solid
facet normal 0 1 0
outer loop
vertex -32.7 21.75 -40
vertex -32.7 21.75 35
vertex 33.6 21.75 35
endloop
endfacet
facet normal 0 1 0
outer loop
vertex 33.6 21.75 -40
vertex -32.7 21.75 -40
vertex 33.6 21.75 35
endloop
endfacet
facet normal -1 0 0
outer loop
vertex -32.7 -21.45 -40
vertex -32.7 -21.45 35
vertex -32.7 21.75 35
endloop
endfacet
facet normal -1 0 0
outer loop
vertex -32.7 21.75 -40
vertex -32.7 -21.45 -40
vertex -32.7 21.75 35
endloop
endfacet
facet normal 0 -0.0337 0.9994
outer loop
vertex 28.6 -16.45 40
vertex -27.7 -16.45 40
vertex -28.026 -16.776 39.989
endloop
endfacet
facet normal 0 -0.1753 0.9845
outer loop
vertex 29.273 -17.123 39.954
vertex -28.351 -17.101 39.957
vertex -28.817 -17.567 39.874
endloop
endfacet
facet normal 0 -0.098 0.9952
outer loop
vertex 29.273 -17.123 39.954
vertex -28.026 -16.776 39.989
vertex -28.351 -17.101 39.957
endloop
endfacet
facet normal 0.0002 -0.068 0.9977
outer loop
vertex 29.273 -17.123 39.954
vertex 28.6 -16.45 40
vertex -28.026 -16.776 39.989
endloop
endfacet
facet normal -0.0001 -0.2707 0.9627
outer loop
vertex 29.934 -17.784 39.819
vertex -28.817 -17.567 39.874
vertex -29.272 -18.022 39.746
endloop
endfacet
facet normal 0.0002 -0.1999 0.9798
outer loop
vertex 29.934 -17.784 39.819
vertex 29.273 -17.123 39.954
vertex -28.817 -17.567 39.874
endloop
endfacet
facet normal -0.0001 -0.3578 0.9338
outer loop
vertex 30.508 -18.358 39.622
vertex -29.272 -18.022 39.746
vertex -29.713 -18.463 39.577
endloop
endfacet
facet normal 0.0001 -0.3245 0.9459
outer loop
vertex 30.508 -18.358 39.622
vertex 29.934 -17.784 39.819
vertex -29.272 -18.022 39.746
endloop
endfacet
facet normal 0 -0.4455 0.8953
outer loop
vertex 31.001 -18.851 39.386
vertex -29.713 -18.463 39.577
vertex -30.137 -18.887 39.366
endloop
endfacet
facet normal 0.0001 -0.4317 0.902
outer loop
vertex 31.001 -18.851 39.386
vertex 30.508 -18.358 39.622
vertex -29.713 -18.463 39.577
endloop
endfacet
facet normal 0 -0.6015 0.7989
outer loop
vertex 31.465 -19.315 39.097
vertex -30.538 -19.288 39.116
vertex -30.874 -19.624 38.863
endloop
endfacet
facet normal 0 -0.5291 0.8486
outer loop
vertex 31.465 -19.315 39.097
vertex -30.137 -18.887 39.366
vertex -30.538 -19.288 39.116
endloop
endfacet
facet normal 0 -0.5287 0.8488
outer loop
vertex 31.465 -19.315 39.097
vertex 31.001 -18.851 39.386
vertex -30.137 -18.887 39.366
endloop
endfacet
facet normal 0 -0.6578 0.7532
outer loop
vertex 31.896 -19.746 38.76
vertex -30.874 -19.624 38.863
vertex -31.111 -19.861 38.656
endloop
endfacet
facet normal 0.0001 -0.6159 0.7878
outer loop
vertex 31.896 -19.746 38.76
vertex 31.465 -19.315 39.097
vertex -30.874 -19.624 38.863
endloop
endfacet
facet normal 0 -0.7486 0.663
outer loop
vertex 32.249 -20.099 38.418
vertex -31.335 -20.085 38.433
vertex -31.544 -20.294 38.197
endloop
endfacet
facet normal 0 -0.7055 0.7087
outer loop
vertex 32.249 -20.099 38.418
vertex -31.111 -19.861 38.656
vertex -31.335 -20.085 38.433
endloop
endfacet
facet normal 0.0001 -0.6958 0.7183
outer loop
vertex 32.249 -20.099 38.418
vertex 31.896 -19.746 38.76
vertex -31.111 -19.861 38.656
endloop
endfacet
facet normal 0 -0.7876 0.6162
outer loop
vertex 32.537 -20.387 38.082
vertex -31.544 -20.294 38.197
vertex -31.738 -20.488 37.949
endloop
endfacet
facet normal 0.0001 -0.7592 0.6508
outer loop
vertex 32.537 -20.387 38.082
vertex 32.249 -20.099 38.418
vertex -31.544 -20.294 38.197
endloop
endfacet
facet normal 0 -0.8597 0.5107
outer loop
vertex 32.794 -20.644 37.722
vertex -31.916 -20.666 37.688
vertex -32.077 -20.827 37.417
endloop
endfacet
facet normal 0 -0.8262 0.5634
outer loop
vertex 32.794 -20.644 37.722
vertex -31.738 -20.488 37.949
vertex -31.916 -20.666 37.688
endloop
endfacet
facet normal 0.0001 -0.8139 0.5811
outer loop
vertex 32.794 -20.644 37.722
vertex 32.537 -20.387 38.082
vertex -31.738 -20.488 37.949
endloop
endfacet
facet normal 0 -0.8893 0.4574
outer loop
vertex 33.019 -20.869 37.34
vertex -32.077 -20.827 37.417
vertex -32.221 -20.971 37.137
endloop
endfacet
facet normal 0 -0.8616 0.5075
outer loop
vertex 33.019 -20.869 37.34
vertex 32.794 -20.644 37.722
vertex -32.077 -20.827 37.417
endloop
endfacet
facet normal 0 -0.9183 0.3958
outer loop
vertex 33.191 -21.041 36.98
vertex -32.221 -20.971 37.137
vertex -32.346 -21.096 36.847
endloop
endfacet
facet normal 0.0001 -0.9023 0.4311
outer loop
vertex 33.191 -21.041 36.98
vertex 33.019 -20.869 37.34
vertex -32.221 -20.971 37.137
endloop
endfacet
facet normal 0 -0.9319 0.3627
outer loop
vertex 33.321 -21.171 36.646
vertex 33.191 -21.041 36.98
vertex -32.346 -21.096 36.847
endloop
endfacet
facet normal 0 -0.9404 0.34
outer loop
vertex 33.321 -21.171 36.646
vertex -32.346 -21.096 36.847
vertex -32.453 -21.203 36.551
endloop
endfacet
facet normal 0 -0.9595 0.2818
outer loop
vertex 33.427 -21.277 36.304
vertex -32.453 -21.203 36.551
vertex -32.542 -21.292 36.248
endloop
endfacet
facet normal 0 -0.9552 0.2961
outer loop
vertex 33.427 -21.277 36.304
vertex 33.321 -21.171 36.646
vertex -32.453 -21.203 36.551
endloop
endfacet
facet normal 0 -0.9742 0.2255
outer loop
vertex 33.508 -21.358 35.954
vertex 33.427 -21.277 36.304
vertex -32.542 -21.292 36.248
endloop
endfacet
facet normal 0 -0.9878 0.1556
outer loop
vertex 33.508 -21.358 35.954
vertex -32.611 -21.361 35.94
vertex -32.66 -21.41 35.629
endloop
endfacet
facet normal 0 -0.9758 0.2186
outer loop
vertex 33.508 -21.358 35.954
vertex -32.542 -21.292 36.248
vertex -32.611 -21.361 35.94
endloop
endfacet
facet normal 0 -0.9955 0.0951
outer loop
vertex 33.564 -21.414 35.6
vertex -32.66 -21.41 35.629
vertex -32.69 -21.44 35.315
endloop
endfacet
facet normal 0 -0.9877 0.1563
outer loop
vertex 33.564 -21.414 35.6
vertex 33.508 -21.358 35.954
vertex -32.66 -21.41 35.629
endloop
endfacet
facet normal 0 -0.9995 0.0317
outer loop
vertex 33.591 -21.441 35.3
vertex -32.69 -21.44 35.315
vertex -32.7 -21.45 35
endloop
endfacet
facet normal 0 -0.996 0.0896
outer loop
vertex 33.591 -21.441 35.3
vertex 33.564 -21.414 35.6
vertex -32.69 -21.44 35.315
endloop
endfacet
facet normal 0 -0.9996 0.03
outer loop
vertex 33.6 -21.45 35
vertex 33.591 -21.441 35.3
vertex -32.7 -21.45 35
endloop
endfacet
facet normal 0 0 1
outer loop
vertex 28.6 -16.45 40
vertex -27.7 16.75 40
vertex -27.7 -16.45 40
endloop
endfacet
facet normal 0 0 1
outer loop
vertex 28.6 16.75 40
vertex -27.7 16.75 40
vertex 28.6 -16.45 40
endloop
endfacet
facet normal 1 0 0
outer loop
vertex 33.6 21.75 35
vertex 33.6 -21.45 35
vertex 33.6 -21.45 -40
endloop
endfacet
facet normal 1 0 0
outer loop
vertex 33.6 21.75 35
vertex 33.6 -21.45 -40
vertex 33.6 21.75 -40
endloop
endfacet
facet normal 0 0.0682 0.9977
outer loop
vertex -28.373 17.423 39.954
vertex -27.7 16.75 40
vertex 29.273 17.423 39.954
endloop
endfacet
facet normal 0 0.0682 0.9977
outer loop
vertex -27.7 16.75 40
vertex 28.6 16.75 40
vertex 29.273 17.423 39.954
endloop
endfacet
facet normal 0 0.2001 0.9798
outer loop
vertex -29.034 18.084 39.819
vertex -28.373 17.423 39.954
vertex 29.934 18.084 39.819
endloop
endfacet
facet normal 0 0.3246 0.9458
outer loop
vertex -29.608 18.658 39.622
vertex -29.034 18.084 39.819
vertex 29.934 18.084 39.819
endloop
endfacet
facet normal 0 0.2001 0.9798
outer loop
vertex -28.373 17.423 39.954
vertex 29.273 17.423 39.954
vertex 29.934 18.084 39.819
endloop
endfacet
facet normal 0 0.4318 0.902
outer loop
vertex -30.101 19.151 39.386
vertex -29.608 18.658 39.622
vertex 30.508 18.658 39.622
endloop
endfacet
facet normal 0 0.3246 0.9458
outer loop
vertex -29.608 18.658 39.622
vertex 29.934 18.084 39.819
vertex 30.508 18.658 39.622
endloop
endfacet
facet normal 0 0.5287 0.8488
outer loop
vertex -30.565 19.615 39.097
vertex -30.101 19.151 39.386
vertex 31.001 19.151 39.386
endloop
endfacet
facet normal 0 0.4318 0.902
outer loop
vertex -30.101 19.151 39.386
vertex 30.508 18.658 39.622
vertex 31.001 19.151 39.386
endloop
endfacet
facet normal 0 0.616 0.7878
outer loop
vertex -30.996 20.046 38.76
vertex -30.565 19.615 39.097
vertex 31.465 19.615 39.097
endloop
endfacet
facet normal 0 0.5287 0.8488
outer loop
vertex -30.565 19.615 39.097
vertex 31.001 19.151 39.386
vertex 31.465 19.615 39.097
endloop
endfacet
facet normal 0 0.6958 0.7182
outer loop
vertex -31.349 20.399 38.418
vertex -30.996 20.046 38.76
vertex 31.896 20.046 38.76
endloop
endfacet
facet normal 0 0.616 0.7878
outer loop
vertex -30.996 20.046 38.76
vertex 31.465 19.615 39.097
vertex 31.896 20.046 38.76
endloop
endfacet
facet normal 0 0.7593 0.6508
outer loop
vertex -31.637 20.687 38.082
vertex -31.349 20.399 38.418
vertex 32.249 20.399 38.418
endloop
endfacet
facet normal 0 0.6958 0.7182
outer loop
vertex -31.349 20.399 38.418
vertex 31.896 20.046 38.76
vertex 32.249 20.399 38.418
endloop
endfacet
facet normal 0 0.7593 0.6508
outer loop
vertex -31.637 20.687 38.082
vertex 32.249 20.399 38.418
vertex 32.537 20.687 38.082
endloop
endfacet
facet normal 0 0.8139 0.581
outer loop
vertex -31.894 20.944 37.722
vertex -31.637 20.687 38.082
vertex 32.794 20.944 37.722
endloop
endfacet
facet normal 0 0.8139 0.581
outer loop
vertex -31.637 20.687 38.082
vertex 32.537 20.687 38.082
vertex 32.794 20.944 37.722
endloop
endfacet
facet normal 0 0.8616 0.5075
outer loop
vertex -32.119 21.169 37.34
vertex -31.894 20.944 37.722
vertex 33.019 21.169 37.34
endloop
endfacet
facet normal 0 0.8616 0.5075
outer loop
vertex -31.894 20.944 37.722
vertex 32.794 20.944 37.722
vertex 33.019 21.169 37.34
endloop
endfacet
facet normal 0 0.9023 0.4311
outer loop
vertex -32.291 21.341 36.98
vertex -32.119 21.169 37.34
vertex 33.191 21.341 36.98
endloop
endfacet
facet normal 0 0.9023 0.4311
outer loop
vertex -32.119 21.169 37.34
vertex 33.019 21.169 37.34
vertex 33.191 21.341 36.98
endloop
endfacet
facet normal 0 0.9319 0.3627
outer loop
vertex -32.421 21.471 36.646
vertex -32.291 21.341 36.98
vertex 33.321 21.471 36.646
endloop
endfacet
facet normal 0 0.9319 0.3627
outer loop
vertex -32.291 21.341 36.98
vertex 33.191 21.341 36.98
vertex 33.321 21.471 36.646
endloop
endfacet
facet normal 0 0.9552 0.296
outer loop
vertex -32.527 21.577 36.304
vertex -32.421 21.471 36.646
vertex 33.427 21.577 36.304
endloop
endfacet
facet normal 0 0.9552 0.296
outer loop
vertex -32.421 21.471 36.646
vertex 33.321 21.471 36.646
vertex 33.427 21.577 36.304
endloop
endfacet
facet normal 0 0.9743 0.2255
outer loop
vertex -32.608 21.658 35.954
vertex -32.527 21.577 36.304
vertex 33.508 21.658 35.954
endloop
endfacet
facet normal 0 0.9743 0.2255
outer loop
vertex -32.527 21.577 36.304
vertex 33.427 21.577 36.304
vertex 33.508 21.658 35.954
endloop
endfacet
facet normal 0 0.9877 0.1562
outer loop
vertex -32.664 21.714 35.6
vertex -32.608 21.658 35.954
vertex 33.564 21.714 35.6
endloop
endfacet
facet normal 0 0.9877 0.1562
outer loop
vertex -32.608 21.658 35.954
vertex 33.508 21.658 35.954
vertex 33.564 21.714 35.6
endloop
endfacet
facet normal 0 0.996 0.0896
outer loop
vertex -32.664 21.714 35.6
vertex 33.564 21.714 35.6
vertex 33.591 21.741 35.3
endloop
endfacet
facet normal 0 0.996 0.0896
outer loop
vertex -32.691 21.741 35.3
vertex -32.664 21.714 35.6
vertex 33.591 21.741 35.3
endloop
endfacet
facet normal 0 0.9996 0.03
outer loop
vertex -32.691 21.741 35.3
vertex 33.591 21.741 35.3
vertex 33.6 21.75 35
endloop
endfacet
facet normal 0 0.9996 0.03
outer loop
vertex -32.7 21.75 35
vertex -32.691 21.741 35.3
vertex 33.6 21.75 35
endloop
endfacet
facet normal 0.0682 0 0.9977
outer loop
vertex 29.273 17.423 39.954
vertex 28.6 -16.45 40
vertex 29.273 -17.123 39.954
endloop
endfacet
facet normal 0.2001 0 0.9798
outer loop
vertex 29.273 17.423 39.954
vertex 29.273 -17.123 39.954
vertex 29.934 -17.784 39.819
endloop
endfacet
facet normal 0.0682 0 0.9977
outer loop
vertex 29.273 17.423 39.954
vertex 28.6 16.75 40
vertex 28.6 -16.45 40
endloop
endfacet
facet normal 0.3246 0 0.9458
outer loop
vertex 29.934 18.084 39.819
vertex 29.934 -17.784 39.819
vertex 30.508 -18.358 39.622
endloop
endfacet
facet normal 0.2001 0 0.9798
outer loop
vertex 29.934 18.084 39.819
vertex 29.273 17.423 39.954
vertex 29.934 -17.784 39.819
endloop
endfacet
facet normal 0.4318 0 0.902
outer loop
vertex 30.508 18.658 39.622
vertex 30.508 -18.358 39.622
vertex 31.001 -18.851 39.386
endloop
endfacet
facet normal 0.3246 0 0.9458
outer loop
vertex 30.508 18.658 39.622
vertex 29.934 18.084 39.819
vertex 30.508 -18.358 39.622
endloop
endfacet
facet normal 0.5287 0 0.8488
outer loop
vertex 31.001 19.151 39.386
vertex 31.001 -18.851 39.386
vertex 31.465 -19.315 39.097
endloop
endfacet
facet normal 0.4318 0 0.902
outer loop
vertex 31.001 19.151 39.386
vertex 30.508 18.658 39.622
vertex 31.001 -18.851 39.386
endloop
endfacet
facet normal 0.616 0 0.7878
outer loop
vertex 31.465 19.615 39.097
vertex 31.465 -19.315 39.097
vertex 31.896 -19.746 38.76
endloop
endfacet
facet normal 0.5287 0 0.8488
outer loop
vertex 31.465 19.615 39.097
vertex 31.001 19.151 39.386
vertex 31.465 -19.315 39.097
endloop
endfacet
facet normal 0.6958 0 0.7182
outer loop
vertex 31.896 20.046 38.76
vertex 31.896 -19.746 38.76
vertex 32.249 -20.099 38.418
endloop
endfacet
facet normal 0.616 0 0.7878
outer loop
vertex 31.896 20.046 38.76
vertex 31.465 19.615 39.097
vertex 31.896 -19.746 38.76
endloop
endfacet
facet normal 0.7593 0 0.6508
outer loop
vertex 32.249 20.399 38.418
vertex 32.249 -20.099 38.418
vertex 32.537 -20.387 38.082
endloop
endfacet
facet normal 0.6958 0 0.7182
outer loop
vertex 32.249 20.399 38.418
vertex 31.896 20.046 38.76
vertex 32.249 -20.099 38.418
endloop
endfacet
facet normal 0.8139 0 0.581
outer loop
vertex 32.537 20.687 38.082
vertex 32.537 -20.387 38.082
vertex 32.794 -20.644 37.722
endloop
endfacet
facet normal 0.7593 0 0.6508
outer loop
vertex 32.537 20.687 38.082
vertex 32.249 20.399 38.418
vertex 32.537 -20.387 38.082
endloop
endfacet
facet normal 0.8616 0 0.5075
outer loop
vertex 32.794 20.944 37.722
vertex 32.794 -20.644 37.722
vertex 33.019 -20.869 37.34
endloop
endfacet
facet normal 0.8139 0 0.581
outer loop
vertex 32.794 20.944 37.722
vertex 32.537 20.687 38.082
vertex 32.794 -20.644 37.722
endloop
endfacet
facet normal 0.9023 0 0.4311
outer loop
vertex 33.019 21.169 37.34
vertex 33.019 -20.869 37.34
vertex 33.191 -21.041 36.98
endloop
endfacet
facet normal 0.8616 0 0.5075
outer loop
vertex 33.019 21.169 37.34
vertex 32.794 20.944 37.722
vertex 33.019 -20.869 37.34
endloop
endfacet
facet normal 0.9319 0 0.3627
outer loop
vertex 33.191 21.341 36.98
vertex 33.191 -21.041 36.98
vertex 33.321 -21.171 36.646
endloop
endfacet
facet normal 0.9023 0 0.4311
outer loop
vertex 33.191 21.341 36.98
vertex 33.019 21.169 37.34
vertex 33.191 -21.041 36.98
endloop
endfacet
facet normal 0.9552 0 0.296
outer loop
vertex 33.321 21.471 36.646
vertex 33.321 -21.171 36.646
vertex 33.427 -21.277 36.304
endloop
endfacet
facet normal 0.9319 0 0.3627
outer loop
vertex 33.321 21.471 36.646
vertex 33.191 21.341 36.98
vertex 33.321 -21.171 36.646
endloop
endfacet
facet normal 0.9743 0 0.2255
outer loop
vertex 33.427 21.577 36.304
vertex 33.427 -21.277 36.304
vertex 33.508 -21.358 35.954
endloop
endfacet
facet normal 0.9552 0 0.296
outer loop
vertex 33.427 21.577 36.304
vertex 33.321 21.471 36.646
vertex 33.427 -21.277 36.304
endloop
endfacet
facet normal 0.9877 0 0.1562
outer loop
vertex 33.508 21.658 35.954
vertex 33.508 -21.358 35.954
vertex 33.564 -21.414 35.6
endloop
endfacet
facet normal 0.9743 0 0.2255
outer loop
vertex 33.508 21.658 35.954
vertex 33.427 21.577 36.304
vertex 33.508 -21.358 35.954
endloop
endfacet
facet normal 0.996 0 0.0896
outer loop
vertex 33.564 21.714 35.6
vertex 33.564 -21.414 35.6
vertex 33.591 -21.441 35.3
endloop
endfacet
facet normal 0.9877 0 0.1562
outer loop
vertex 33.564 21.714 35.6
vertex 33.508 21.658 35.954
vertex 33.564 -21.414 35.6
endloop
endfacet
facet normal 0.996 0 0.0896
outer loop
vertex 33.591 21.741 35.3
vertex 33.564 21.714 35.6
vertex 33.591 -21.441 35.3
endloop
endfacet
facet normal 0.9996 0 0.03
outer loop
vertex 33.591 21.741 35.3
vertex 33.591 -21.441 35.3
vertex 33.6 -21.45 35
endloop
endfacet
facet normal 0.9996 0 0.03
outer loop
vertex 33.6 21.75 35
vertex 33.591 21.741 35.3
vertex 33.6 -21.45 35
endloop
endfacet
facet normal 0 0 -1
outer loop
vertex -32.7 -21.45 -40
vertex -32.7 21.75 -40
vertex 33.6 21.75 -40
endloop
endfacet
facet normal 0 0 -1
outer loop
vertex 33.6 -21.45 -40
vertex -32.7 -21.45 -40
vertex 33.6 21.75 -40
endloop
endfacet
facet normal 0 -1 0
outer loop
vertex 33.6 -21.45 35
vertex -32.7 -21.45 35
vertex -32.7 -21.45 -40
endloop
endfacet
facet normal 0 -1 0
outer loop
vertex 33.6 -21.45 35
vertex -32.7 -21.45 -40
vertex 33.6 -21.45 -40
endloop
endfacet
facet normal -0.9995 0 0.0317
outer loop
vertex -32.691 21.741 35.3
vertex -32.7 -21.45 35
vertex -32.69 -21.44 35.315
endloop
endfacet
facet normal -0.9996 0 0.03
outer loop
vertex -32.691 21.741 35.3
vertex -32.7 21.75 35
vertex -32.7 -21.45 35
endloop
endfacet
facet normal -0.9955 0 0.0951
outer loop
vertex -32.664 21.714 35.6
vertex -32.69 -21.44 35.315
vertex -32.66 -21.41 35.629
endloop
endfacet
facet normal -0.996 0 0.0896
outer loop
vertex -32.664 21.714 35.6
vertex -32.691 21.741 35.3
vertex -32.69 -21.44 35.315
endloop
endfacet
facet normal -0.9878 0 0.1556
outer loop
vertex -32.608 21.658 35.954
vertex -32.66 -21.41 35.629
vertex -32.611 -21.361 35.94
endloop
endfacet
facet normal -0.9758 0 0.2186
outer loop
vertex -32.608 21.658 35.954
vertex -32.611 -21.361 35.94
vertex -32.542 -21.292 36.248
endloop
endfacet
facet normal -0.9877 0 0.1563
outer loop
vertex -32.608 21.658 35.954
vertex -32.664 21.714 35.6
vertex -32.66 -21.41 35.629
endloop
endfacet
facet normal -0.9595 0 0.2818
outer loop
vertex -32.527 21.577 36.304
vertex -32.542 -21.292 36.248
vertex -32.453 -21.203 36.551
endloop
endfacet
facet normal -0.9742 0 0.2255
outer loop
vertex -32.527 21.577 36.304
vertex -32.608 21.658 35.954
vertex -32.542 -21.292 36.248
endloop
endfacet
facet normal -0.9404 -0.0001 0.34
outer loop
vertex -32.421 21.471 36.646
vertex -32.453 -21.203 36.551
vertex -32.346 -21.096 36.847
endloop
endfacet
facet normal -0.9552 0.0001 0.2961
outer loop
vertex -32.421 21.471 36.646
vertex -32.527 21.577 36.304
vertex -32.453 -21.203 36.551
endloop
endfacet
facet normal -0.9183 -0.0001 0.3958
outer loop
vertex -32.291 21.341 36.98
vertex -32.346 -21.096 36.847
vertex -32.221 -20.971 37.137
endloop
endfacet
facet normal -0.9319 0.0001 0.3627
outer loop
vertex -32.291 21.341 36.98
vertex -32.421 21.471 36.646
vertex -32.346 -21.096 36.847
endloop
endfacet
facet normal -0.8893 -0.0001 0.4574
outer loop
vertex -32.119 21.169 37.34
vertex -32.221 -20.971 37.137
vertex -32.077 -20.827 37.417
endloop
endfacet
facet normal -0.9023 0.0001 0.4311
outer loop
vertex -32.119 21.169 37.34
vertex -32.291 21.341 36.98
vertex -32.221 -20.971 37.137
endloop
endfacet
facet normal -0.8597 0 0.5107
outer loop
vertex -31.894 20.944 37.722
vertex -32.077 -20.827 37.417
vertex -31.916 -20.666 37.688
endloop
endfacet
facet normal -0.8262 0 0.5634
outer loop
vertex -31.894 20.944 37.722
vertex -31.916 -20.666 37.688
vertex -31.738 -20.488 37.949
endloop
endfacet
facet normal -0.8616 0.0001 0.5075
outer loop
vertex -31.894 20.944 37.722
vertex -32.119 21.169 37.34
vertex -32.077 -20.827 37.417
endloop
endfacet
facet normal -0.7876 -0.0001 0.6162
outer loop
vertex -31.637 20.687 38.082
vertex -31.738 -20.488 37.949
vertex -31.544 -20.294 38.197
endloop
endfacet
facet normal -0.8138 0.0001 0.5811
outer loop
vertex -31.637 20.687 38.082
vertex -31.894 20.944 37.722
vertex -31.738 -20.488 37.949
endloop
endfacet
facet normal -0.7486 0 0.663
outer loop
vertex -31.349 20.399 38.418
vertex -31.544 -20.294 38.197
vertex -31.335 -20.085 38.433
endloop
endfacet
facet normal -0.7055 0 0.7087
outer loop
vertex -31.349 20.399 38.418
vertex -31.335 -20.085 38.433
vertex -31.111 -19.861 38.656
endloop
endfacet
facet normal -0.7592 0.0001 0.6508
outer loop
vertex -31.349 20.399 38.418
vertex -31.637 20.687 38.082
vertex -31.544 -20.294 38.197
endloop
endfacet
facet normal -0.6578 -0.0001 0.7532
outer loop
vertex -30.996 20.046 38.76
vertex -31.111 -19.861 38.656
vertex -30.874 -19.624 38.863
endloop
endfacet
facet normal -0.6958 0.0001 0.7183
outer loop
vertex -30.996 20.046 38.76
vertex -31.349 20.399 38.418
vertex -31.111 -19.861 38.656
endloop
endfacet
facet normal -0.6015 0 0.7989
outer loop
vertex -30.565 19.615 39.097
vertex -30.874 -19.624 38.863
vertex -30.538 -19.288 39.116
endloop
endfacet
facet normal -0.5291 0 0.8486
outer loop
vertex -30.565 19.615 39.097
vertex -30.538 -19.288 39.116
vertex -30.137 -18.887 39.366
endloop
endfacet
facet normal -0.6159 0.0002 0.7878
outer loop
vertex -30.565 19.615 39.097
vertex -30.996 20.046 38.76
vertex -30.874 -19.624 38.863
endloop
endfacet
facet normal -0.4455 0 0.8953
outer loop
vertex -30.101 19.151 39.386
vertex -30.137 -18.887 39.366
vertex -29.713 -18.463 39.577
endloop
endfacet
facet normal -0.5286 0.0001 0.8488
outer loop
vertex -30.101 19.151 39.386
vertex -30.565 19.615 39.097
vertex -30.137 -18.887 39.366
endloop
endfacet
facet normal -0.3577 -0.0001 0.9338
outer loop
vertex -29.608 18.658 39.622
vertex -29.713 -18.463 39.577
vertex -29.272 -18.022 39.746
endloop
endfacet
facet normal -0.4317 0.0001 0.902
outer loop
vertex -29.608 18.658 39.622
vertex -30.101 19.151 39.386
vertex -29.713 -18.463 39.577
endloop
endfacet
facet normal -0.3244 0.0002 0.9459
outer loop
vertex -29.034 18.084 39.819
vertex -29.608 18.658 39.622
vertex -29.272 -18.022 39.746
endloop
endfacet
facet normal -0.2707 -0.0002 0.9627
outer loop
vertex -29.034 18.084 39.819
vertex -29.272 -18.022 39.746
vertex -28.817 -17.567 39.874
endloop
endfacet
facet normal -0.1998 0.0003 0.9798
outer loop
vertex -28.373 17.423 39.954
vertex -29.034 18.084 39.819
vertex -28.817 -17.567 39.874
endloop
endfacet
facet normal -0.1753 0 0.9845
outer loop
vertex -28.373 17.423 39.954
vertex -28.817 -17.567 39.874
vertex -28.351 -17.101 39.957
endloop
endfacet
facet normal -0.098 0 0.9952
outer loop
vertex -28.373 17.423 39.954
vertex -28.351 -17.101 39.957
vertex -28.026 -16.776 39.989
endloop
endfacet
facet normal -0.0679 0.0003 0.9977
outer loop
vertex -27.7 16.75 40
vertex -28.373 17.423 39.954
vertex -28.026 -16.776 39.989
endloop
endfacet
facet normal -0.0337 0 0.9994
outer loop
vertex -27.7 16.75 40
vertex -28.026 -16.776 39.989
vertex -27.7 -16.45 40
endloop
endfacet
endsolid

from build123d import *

# Parameters (mm, degrees)
F0_W     = 66.300001
F0_H     = 43.200001
F1_DEPTH = 40
F2_R     = 5


with BuildPart() as f1:
    # F0 (on Top) → F1 (new body, symmetric)
    with BuildSketch(Plane.XY):
        with Locations((0.449998, 0.149999)):
            Rectangle(F0_W, F0_H)
    extrude(amount=F1_DEPTH, both=True)

    # F2
    f2_edges = [f1.edges().sort_by_distance(p)[0] for p in [
        (0.449998, 21.749999, 40),
        (-32.700002, 0.149999, 40),
        (0.449998, -21.450002, 40),
        (33.599999, 0.149999, 40),
    ]]
    fillet(f2_edges, radius=F2_R)


solid = f1.part
